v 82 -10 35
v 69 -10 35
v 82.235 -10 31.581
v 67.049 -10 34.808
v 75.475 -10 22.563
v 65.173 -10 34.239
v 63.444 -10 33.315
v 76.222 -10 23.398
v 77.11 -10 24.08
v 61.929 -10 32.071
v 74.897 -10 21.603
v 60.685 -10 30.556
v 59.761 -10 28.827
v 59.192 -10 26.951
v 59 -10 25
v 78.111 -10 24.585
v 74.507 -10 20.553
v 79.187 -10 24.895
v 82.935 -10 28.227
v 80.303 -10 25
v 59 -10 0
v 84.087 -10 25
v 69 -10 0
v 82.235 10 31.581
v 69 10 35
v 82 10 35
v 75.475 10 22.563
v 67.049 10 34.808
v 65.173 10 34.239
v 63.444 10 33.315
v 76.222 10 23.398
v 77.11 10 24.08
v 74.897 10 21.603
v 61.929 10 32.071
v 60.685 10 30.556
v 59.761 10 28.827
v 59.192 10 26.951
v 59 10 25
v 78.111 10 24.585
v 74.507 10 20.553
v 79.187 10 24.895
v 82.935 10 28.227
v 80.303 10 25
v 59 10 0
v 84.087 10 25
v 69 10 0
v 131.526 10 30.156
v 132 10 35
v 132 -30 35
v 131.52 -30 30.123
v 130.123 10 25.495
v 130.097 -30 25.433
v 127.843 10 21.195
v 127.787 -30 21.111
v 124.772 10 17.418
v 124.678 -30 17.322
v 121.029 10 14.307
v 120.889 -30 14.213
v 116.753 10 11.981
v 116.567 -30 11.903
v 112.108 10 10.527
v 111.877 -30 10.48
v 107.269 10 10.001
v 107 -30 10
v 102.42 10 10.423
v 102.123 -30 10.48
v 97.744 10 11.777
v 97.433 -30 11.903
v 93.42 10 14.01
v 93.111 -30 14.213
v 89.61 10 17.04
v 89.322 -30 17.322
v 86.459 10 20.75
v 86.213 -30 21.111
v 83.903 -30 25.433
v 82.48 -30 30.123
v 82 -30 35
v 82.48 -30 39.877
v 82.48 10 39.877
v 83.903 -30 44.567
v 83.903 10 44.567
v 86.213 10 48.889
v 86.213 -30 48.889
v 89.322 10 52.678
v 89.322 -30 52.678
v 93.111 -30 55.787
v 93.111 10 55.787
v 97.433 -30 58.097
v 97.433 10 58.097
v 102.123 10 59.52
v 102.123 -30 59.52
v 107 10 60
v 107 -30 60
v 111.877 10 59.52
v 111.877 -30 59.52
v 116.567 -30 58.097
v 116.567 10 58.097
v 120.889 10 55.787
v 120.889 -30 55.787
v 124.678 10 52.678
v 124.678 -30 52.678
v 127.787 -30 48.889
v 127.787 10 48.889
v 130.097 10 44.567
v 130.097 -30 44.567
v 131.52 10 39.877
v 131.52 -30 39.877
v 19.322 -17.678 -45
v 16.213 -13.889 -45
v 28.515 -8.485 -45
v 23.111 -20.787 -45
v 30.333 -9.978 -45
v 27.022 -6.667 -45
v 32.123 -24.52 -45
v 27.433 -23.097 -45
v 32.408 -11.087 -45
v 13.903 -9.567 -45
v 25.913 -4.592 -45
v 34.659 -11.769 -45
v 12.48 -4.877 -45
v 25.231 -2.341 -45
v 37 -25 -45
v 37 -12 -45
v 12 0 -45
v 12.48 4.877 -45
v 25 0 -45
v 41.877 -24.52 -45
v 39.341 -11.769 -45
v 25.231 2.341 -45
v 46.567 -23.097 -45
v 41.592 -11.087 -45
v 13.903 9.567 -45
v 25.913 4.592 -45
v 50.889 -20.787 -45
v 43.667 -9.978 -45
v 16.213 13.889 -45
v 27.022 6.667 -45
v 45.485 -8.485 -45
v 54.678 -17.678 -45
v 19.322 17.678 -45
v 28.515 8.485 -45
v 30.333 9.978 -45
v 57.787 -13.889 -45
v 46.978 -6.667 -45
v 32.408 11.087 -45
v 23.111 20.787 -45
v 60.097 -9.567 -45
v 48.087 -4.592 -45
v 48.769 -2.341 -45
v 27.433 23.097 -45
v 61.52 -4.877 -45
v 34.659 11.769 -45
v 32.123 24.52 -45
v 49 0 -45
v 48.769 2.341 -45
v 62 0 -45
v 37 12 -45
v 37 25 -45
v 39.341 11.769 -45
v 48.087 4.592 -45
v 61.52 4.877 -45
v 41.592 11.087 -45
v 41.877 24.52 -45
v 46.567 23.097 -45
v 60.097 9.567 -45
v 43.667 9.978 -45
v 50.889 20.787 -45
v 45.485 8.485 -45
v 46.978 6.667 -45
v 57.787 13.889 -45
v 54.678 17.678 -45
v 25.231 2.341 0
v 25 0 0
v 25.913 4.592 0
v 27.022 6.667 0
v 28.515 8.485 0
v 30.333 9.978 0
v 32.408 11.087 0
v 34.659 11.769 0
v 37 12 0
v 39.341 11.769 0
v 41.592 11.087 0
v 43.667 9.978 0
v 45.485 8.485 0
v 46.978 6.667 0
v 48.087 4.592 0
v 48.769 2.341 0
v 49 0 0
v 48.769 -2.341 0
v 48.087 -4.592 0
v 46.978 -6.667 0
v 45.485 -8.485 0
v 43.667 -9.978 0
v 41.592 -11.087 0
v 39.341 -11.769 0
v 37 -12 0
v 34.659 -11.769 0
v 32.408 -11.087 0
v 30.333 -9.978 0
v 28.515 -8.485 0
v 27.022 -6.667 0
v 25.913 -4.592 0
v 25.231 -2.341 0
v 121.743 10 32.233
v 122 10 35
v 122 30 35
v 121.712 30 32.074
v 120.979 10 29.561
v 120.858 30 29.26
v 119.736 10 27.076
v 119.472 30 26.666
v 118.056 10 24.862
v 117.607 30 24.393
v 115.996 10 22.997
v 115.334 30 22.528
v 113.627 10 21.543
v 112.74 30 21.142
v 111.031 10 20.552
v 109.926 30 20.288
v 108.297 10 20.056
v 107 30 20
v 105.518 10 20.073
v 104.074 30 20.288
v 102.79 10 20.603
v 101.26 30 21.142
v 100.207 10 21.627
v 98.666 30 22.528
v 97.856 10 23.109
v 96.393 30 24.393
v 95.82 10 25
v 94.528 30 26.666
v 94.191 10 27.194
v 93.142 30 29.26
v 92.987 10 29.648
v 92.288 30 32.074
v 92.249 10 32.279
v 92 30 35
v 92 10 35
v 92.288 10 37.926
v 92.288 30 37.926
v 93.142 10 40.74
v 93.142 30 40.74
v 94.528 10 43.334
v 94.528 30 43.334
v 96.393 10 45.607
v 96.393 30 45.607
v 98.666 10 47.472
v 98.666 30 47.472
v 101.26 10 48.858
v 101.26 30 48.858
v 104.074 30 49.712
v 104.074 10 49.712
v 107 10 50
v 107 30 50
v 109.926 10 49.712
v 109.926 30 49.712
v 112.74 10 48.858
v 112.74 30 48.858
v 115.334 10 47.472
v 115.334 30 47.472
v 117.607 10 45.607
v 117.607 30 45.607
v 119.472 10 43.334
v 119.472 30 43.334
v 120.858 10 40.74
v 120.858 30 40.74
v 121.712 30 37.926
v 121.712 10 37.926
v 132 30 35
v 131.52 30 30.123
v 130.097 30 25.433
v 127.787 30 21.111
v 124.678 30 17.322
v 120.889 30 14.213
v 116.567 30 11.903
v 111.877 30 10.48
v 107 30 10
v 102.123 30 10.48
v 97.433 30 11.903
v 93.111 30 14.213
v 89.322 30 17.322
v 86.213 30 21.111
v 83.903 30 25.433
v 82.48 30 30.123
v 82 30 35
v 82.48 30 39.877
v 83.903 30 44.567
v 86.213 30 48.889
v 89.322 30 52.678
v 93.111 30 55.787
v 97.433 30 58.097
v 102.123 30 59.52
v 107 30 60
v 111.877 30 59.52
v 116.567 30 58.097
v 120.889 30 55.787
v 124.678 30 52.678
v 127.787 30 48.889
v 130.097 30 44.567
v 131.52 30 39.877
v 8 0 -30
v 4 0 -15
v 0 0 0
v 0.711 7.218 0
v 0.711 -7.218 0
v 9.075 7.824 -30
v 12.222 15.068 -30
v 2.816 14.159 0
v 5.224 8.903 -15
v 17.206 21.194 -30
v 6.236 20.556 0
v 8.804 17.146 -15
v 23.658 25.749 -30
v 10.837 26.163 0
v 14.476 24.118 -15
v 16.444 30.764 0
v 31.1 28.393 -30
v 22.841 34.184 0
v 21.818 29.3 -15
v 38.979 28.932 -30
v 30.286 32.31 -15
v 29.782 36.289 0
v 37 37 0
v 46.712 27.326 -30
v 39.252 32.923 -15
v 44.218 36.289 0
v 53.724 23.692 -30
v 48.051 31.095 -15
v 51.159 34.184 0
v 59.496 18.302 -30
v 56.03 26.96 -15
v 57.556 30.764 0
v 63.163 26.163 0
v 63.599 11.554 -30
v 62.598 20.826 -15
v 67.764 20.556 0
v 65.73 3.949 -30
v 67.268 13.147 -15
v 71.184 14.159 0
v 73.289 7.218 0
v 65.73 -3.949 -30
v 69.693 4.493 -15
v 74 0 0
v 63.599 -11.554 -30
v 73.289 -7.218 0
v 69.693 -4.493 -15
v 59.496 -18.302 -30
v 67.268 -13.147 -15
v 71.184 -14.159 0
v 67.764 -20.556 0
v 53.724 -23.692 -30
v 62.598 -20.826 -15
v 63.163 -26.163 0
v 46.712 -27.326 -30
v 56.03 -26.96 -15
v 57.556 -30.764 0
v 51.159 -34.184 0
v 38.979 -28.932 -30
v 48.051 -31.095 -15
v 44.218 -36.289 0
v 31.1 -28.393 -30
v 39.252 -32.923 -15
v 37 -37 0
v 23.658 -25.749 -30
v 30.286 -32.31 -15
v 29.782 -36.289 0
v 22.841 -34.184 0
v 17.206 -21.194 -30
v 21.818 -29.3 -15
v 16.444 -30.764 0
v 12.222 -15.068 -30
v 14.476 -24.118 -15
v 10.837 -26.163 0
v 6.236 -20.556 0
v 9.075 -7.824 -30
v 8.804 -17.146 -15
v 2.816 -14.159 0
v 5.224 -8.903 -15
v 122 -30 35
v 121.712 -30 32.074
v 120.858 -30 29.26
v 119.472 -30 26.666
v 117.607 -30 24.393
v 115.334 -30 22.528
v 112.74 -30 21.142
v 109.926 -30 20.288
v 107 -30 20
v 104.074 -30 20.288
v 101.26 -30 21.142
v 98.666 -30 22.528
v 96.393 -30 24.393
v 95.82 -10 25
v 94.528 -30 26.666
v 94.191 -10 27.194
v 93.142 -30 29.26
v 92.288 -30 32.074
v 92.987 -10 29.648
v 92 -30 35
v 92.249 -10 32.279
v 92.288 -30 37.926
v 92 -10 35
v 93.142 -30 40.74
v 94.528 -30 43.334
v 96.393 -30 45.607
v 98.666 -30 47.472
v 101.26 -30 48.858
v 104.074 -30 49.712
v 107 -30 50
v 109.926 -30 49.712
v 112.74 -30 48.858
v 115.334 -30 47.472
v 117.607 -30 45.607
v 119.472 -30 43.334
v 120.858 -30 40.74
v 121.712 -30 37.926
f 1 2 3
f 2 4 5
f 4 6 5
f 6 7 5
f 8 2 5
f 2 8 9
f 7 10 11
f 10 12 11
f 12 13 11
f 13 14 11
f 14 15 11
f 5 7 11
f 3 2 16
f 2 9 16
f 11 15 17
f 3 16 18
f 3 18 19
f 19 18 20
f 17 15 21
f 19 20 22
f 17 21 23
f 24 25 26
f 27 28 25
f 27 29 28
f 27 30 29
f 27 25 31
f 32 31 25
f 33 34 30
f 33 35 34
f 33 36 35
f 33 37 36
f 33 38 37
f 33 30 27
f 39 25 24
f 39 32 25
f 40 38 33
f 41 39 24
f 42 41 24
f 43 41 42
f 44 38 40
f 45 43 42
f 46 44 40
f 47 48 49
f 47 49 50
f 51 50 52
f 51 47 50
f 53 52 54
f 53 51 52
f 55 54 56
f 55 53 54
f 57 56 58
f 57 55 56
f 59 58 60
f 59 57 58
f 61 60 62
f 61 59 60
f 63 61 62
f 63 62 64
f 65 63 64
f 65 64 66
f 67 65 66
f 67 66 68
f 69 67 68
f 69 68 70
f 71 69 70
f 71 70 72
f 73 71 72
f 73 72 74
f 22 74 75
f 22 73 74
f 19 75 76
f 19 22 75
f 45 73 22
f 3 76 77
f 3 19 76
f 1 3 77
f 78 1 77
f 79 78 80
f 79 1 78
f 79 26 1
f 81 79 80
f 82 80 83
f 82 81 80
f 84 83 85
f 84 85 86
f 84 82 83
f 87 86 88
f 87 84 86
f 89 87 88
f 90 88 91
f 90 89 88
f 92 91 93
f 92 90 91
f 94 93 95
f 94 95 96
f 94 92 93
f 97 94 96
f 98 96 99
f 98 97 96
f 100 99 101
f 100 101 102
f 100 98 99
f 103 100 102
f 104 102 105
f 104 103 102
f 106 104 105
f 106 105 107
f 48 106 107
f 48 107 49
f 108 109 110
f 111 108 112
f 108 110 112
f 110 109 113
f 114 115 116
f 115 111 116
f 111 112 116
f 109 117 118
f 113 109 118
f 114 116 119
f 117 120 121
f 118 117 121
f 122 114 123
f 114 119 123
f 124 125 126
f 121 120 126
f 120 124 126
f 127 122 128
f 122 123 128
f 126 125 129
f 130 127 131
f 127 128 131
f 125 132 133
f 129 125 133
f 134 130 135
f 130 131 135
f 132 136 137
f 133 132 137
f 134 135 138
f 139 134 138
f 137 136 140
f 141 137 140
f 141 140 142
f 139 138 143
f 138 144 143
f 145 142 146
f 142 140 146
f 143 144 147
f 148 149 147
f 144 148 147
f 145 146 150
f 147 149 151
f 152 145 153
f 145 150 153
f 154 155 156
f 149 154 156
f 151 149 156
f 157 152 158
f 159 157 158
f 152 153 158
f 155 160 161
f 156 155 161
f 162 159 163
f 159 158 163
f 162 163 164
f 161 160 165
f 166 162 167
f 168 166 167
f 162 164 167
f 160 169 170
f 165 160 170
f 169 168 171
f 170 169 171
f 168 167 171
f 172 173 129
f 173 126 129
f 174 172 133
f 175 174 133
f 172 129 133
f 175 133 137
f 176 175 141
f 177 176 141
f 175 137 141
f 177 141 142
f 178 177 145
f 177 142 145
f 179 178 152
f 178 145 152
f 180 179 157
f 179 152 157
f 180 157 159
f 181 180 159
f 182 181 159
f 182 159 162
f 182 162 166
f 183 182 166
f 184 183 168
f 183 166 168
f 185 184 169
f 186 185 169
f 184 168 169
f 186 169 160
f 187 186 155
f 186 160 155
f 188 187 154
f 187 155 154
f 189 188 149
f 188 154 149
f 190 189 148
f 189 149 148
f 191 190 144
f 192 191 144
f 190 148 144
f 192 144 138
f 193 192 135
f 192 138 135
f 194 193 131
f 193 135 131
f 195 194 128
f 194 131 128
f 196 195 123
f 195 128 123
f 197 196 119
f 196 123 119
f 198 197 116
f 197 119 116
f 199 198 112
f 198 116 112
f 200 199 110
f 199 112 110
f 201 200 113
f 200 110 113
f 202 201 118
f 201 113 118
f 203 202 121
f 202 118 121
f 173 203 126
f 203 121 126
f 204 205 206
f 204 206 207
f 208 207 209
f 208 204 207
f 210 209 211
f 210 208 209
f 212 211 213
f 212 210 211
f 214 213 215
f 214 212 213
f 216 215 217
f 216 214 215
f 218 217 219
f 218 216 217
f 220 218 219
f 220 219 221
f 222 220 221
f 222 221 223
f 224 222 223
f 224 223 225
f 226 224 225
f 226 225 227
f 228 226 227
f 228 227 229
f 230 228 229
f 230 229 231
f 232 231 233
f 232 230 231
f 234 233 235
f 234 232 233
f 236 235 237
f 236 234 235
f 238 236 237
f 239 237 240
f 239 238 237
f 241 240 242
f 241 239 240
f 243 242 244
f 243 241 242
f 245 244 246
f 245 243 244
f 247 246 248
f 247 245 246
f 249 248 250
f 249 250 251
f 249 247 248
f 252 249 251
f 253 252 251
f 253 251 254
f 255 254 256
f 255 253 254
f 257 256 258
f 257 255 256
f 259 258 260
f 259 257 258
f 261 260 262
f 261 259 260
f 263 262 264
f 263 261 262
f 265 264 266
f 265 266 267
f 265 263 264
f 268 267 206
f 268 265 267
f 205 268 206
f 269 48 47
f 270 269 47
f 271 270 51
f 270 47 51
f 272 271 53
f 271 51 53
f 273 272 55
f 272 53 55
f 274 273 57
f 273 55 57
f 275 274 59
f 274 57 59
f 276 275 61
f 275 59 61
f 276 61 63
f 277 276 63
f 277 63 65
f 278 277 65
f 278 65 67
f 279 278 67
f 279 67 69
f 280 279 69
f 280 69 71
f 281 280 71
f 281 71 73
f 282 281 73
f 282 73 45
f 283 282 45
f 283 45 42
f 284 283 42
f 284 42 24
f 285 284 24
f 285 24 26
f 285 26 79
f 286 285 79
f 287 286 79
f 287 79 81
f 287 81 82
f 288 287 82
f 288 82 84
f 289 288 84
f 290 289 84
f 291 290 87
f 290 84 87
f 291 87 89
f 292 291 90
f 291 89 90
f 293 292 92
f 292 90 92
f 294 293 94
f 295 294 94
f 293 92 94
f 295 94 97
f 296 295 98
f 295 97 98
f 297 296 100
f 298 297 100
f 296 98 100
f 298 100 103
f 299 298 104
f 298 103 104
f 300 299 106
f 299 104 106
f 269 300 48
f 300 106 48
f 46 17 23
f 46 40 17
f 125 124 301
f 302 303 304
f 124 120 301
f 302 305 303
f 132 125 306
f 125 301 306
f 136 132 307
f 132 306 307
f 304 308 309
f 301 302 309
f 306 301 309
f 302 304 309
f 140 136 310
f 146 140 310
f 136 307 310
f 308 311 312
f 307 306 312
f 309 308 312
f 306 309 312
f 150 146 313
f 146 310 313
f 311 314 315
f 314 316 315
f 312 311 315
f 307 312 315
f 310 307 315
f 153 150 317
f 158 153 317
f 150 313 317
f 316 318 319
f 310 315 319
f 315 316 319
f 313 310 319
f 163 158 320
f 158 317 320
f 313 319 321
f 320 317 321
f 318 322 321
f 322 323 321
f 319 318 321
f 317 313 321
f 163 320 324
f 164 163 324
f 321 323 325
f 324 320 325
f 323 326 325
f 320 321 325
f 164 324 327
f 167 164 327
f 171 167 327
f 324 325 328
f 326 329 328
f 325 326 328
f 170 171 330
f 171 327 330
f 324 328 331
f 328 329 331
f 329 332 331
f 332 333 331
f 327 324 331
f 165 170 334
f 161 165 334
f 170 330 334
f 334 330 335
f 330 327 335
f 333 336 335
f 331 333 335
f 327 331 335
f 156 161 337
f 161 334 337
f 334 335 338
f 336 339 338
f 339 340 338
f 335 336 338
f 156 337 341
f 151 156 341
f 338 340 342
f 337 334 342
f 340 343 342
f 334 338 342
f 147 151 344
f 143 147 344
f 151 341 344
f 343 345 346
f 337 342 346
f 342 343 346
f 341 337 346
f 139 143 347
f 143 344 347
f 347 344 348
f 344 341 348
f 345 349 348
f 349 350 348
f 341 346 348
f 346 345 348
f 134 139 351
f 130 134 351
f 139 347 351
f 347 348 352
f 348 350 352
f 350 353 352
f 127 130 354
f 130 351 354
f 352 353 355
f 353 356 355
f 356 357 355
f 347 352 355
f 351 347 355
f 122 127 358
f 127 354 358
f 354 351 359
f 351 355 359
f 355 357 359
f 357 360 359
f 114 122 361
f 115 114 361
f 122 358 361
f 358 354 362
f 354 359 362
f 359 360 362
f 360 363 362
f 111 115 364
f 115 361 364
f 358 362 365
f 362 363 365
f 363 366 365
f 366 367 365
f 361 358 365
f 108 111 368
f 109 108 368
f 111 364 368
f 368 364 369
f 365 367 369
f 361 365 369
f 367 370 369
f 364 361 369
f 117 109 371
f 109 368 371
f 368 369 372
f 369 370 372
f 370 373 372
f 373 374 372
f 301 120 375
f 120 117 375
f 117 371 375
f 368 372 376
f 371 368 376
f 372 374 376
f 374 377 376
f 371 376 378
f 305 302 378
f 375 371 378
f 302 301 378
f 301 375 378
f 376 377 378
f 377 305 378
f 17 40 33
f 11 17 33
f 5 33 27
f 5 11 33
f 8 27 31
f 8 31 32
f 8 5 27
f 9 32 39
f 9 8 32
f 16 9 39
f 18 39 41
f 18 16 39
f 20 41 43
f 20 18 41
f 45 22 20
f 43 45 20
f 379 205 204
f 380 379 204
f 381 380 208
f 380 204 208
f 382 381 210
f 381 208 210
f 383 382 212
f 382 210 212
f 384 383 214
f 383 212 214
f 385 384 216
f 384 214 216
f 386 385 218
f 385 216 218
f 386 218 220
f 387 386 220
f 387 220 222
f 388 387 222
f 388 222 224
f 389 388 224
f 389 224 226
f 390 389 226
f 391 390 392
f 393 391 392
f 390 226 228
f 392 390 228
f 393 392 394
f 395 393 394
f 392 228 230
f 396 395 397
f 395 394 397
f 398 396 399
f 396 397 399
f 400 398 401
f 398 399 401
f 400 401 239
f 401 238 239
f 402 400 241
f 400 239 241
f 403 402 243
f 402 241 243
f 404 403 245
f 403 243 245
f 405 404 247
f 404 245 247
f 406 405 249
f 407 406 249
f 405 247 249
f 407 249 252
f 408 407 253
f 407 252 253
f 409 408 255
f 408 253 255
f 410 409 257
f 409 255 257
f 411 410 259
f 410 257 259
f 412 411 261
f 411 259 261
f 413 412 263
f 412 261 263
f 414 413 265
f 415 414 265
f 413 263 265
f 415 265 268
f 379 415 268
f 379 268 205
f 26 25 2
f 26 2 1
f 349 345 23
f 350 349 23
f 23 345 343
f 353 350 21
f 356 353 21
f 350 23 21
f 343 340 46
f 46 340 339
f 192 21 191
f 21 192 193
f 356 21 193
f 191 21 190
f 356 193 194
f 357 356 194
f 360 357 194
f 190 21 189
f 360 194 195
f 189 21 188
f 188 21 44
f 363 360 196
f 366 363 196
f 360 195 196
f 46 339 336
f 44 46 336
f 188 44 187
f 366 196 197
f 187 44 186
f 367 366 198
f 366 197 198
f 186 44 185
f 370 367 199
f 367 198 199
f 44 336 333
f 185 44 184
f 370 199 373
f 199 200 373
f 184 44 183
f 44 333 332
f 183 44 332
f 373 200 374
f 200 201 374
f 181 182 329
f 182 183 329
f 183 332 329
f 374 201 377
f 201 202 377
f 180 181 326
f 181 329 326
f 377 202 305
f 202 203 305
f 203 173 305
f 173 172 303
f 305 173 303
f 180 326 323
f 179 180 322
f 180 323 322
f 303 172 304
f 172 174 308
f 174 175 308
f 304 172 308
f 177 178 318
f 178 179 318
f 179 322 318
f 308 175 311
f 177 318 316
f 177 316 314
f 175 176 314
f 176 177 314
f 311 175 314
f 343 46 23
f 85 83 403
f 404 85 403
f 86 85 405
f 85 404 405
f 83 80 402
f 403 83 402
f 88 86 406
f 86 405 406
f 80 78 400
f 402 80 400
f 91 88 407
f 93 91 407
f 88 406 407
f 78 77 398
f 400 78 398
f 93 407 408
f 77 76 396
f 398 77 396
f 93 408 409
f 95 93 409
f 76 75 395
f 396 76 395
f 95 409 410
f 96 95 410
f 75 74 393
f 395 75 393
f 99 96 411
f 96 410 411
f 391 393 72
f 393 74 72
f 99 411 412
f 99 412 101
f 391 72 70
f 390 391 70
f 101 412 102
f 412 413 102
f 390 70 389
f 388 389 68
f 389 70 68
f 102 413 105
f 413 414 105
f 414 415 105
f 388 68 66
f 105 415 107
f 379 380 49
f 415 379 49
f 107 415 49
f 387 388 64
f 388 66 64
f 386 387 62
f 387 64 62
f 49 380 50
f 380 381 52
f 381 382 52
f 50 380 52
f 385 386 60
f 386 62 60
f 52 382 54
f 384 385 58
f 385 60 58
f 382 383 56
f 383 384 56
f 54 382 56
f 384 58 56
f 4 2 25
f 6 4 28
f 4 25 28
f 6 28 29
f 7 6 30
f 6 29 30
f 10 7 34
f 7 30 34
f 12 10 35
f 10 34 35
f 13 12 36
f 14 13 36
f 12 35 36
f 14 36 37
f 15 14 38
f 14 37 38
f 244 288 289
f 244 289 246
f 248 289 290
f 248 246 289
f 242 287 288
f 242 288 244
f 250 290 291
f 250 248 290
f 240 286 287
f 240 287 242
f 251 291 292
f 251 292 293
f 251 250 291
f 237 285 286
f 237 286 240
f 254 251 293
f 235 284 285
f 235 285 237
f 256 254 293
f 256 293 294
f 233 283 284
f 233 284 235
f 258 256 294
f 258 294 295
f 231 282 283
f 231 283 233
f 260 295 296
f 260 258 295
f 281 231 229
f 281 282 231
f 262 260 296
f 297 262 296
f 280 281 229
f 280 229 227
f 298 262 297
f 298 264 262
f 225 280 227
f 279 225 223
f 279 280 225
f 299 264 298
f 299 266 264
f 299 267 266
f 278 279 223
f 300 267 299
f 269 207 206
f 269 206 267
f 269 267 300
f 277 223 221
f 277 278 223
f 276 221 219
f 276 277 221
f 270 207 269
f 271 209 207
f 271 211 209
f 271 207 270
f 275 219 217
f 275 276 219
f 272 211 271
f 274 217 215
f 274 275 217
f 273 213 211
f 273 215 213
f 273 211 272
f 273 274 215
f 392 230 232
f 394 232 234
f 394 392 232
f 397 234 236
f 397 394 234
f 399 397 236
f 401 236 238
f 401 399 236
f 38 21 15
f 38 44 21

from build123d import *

# Parameters (mm, degrees)
SKETCH3_W                = 10
SKETCH3_H                = 25
SKETCH3_H_2              = 10
BOSS_EXTRUDE1_DEPTH      = 10
FILLET1_R                = 6
FILLET2_R                = 10
SKETCH4_R                = 15
CUT_EXTRUDE1_DEPTH       = 48
SKETCH4_3_R              = 25
SKETCH4_3_R_2            = 15
BOSS_EXTRUDE2_DEPTH      = 20
BOSS_EXTRUDE2_DEPTH_BACK = 40


with BuildPart() as part:
    # Sketch1 → Revolve1 (revolve)
    with BuildSketch(Plane(origin=(0, 0, 0), x_dir=(1, 0, 0), z_dir=(0, 1, 0))):
        Polygon((12, 45), (0, 0), (25, 0), (25, 45), align=None)
    revolve(axis=Axis((37, 0, 0), (0, 0, -1)))

    # Sketch3 → Boss-Extrude1 (add, symmetric)
    with BuildSketch(Plane(origin=(0, 0, 0), x_dir=(1, 0, 0), z_dir=(0, 1, 0))):
        with Locations((64, -12.5)):
            Rectangle(SKETCH3_W, SKETCH3_H)
        with Locations((64, -30)):
            Rectangle(SKETCH3_W, SKETCH3_H_2)
        Polygon((75.698729811, -25), (69, -25), (69, -35), (107, -35), (107, -25), align=None)
        Polygon((75.698729811, -25), (69, 0), (69, -25), align=None)
    extrude(amount=BOSS_EXTRUDE1_DEPTH, both=True)

    # Fillet1
    fillet1_edges = [part.edges().sort_by_distance(p)[0] for p in [
        (75.698729811, 0, 25),
    ]]
    fillet(fillet1_edges, radius=FILLET1_R)

    # Fillet2
    fillet2_edges = [part.edges().sort_by_distance(p)[0] for p in [
        (59, 0, 35),
    ]]
    fillet(fillet2_edges, radius=FILLET2_R)

    # Sketch4 → Cut-Extrude1 (cut, through all)
    with BuildSketch(Plane(origin=(0, 10, 0), x_dir=(1, 0, 0), z_dir=(0, 1, 0))):
        with Locations((107, -35)):
            Circle(SKETCH4_R)
    extrude(amount=-CUT_EXTRUDE1_DEPTH, mode=Mode.SUBTRACT)

    # Sketch4_3 → Boss-Extrude2 (add, two sides)
    with BuildSketch(Plane(origin=(0, 10, 0), x_dir=(1, 0, 0), z_dir=(0, 1, 0))) as boss_extrude2_sk:
        with Locations((107, -35)):
            Circle(SKETCH4_3_R)
        with Locations((107, -35)):
            Circle(SKETCH4_3_R_2, mode=Mode.SUBTRACT)
    extrude(amount=BOSS_EXTRUDE2_DEPTH)
    extrude(boss_extrude2_sk.sketch, amount=-BOSS_EXTRUDE2_DEPTH_BACK)


solid = part.part
